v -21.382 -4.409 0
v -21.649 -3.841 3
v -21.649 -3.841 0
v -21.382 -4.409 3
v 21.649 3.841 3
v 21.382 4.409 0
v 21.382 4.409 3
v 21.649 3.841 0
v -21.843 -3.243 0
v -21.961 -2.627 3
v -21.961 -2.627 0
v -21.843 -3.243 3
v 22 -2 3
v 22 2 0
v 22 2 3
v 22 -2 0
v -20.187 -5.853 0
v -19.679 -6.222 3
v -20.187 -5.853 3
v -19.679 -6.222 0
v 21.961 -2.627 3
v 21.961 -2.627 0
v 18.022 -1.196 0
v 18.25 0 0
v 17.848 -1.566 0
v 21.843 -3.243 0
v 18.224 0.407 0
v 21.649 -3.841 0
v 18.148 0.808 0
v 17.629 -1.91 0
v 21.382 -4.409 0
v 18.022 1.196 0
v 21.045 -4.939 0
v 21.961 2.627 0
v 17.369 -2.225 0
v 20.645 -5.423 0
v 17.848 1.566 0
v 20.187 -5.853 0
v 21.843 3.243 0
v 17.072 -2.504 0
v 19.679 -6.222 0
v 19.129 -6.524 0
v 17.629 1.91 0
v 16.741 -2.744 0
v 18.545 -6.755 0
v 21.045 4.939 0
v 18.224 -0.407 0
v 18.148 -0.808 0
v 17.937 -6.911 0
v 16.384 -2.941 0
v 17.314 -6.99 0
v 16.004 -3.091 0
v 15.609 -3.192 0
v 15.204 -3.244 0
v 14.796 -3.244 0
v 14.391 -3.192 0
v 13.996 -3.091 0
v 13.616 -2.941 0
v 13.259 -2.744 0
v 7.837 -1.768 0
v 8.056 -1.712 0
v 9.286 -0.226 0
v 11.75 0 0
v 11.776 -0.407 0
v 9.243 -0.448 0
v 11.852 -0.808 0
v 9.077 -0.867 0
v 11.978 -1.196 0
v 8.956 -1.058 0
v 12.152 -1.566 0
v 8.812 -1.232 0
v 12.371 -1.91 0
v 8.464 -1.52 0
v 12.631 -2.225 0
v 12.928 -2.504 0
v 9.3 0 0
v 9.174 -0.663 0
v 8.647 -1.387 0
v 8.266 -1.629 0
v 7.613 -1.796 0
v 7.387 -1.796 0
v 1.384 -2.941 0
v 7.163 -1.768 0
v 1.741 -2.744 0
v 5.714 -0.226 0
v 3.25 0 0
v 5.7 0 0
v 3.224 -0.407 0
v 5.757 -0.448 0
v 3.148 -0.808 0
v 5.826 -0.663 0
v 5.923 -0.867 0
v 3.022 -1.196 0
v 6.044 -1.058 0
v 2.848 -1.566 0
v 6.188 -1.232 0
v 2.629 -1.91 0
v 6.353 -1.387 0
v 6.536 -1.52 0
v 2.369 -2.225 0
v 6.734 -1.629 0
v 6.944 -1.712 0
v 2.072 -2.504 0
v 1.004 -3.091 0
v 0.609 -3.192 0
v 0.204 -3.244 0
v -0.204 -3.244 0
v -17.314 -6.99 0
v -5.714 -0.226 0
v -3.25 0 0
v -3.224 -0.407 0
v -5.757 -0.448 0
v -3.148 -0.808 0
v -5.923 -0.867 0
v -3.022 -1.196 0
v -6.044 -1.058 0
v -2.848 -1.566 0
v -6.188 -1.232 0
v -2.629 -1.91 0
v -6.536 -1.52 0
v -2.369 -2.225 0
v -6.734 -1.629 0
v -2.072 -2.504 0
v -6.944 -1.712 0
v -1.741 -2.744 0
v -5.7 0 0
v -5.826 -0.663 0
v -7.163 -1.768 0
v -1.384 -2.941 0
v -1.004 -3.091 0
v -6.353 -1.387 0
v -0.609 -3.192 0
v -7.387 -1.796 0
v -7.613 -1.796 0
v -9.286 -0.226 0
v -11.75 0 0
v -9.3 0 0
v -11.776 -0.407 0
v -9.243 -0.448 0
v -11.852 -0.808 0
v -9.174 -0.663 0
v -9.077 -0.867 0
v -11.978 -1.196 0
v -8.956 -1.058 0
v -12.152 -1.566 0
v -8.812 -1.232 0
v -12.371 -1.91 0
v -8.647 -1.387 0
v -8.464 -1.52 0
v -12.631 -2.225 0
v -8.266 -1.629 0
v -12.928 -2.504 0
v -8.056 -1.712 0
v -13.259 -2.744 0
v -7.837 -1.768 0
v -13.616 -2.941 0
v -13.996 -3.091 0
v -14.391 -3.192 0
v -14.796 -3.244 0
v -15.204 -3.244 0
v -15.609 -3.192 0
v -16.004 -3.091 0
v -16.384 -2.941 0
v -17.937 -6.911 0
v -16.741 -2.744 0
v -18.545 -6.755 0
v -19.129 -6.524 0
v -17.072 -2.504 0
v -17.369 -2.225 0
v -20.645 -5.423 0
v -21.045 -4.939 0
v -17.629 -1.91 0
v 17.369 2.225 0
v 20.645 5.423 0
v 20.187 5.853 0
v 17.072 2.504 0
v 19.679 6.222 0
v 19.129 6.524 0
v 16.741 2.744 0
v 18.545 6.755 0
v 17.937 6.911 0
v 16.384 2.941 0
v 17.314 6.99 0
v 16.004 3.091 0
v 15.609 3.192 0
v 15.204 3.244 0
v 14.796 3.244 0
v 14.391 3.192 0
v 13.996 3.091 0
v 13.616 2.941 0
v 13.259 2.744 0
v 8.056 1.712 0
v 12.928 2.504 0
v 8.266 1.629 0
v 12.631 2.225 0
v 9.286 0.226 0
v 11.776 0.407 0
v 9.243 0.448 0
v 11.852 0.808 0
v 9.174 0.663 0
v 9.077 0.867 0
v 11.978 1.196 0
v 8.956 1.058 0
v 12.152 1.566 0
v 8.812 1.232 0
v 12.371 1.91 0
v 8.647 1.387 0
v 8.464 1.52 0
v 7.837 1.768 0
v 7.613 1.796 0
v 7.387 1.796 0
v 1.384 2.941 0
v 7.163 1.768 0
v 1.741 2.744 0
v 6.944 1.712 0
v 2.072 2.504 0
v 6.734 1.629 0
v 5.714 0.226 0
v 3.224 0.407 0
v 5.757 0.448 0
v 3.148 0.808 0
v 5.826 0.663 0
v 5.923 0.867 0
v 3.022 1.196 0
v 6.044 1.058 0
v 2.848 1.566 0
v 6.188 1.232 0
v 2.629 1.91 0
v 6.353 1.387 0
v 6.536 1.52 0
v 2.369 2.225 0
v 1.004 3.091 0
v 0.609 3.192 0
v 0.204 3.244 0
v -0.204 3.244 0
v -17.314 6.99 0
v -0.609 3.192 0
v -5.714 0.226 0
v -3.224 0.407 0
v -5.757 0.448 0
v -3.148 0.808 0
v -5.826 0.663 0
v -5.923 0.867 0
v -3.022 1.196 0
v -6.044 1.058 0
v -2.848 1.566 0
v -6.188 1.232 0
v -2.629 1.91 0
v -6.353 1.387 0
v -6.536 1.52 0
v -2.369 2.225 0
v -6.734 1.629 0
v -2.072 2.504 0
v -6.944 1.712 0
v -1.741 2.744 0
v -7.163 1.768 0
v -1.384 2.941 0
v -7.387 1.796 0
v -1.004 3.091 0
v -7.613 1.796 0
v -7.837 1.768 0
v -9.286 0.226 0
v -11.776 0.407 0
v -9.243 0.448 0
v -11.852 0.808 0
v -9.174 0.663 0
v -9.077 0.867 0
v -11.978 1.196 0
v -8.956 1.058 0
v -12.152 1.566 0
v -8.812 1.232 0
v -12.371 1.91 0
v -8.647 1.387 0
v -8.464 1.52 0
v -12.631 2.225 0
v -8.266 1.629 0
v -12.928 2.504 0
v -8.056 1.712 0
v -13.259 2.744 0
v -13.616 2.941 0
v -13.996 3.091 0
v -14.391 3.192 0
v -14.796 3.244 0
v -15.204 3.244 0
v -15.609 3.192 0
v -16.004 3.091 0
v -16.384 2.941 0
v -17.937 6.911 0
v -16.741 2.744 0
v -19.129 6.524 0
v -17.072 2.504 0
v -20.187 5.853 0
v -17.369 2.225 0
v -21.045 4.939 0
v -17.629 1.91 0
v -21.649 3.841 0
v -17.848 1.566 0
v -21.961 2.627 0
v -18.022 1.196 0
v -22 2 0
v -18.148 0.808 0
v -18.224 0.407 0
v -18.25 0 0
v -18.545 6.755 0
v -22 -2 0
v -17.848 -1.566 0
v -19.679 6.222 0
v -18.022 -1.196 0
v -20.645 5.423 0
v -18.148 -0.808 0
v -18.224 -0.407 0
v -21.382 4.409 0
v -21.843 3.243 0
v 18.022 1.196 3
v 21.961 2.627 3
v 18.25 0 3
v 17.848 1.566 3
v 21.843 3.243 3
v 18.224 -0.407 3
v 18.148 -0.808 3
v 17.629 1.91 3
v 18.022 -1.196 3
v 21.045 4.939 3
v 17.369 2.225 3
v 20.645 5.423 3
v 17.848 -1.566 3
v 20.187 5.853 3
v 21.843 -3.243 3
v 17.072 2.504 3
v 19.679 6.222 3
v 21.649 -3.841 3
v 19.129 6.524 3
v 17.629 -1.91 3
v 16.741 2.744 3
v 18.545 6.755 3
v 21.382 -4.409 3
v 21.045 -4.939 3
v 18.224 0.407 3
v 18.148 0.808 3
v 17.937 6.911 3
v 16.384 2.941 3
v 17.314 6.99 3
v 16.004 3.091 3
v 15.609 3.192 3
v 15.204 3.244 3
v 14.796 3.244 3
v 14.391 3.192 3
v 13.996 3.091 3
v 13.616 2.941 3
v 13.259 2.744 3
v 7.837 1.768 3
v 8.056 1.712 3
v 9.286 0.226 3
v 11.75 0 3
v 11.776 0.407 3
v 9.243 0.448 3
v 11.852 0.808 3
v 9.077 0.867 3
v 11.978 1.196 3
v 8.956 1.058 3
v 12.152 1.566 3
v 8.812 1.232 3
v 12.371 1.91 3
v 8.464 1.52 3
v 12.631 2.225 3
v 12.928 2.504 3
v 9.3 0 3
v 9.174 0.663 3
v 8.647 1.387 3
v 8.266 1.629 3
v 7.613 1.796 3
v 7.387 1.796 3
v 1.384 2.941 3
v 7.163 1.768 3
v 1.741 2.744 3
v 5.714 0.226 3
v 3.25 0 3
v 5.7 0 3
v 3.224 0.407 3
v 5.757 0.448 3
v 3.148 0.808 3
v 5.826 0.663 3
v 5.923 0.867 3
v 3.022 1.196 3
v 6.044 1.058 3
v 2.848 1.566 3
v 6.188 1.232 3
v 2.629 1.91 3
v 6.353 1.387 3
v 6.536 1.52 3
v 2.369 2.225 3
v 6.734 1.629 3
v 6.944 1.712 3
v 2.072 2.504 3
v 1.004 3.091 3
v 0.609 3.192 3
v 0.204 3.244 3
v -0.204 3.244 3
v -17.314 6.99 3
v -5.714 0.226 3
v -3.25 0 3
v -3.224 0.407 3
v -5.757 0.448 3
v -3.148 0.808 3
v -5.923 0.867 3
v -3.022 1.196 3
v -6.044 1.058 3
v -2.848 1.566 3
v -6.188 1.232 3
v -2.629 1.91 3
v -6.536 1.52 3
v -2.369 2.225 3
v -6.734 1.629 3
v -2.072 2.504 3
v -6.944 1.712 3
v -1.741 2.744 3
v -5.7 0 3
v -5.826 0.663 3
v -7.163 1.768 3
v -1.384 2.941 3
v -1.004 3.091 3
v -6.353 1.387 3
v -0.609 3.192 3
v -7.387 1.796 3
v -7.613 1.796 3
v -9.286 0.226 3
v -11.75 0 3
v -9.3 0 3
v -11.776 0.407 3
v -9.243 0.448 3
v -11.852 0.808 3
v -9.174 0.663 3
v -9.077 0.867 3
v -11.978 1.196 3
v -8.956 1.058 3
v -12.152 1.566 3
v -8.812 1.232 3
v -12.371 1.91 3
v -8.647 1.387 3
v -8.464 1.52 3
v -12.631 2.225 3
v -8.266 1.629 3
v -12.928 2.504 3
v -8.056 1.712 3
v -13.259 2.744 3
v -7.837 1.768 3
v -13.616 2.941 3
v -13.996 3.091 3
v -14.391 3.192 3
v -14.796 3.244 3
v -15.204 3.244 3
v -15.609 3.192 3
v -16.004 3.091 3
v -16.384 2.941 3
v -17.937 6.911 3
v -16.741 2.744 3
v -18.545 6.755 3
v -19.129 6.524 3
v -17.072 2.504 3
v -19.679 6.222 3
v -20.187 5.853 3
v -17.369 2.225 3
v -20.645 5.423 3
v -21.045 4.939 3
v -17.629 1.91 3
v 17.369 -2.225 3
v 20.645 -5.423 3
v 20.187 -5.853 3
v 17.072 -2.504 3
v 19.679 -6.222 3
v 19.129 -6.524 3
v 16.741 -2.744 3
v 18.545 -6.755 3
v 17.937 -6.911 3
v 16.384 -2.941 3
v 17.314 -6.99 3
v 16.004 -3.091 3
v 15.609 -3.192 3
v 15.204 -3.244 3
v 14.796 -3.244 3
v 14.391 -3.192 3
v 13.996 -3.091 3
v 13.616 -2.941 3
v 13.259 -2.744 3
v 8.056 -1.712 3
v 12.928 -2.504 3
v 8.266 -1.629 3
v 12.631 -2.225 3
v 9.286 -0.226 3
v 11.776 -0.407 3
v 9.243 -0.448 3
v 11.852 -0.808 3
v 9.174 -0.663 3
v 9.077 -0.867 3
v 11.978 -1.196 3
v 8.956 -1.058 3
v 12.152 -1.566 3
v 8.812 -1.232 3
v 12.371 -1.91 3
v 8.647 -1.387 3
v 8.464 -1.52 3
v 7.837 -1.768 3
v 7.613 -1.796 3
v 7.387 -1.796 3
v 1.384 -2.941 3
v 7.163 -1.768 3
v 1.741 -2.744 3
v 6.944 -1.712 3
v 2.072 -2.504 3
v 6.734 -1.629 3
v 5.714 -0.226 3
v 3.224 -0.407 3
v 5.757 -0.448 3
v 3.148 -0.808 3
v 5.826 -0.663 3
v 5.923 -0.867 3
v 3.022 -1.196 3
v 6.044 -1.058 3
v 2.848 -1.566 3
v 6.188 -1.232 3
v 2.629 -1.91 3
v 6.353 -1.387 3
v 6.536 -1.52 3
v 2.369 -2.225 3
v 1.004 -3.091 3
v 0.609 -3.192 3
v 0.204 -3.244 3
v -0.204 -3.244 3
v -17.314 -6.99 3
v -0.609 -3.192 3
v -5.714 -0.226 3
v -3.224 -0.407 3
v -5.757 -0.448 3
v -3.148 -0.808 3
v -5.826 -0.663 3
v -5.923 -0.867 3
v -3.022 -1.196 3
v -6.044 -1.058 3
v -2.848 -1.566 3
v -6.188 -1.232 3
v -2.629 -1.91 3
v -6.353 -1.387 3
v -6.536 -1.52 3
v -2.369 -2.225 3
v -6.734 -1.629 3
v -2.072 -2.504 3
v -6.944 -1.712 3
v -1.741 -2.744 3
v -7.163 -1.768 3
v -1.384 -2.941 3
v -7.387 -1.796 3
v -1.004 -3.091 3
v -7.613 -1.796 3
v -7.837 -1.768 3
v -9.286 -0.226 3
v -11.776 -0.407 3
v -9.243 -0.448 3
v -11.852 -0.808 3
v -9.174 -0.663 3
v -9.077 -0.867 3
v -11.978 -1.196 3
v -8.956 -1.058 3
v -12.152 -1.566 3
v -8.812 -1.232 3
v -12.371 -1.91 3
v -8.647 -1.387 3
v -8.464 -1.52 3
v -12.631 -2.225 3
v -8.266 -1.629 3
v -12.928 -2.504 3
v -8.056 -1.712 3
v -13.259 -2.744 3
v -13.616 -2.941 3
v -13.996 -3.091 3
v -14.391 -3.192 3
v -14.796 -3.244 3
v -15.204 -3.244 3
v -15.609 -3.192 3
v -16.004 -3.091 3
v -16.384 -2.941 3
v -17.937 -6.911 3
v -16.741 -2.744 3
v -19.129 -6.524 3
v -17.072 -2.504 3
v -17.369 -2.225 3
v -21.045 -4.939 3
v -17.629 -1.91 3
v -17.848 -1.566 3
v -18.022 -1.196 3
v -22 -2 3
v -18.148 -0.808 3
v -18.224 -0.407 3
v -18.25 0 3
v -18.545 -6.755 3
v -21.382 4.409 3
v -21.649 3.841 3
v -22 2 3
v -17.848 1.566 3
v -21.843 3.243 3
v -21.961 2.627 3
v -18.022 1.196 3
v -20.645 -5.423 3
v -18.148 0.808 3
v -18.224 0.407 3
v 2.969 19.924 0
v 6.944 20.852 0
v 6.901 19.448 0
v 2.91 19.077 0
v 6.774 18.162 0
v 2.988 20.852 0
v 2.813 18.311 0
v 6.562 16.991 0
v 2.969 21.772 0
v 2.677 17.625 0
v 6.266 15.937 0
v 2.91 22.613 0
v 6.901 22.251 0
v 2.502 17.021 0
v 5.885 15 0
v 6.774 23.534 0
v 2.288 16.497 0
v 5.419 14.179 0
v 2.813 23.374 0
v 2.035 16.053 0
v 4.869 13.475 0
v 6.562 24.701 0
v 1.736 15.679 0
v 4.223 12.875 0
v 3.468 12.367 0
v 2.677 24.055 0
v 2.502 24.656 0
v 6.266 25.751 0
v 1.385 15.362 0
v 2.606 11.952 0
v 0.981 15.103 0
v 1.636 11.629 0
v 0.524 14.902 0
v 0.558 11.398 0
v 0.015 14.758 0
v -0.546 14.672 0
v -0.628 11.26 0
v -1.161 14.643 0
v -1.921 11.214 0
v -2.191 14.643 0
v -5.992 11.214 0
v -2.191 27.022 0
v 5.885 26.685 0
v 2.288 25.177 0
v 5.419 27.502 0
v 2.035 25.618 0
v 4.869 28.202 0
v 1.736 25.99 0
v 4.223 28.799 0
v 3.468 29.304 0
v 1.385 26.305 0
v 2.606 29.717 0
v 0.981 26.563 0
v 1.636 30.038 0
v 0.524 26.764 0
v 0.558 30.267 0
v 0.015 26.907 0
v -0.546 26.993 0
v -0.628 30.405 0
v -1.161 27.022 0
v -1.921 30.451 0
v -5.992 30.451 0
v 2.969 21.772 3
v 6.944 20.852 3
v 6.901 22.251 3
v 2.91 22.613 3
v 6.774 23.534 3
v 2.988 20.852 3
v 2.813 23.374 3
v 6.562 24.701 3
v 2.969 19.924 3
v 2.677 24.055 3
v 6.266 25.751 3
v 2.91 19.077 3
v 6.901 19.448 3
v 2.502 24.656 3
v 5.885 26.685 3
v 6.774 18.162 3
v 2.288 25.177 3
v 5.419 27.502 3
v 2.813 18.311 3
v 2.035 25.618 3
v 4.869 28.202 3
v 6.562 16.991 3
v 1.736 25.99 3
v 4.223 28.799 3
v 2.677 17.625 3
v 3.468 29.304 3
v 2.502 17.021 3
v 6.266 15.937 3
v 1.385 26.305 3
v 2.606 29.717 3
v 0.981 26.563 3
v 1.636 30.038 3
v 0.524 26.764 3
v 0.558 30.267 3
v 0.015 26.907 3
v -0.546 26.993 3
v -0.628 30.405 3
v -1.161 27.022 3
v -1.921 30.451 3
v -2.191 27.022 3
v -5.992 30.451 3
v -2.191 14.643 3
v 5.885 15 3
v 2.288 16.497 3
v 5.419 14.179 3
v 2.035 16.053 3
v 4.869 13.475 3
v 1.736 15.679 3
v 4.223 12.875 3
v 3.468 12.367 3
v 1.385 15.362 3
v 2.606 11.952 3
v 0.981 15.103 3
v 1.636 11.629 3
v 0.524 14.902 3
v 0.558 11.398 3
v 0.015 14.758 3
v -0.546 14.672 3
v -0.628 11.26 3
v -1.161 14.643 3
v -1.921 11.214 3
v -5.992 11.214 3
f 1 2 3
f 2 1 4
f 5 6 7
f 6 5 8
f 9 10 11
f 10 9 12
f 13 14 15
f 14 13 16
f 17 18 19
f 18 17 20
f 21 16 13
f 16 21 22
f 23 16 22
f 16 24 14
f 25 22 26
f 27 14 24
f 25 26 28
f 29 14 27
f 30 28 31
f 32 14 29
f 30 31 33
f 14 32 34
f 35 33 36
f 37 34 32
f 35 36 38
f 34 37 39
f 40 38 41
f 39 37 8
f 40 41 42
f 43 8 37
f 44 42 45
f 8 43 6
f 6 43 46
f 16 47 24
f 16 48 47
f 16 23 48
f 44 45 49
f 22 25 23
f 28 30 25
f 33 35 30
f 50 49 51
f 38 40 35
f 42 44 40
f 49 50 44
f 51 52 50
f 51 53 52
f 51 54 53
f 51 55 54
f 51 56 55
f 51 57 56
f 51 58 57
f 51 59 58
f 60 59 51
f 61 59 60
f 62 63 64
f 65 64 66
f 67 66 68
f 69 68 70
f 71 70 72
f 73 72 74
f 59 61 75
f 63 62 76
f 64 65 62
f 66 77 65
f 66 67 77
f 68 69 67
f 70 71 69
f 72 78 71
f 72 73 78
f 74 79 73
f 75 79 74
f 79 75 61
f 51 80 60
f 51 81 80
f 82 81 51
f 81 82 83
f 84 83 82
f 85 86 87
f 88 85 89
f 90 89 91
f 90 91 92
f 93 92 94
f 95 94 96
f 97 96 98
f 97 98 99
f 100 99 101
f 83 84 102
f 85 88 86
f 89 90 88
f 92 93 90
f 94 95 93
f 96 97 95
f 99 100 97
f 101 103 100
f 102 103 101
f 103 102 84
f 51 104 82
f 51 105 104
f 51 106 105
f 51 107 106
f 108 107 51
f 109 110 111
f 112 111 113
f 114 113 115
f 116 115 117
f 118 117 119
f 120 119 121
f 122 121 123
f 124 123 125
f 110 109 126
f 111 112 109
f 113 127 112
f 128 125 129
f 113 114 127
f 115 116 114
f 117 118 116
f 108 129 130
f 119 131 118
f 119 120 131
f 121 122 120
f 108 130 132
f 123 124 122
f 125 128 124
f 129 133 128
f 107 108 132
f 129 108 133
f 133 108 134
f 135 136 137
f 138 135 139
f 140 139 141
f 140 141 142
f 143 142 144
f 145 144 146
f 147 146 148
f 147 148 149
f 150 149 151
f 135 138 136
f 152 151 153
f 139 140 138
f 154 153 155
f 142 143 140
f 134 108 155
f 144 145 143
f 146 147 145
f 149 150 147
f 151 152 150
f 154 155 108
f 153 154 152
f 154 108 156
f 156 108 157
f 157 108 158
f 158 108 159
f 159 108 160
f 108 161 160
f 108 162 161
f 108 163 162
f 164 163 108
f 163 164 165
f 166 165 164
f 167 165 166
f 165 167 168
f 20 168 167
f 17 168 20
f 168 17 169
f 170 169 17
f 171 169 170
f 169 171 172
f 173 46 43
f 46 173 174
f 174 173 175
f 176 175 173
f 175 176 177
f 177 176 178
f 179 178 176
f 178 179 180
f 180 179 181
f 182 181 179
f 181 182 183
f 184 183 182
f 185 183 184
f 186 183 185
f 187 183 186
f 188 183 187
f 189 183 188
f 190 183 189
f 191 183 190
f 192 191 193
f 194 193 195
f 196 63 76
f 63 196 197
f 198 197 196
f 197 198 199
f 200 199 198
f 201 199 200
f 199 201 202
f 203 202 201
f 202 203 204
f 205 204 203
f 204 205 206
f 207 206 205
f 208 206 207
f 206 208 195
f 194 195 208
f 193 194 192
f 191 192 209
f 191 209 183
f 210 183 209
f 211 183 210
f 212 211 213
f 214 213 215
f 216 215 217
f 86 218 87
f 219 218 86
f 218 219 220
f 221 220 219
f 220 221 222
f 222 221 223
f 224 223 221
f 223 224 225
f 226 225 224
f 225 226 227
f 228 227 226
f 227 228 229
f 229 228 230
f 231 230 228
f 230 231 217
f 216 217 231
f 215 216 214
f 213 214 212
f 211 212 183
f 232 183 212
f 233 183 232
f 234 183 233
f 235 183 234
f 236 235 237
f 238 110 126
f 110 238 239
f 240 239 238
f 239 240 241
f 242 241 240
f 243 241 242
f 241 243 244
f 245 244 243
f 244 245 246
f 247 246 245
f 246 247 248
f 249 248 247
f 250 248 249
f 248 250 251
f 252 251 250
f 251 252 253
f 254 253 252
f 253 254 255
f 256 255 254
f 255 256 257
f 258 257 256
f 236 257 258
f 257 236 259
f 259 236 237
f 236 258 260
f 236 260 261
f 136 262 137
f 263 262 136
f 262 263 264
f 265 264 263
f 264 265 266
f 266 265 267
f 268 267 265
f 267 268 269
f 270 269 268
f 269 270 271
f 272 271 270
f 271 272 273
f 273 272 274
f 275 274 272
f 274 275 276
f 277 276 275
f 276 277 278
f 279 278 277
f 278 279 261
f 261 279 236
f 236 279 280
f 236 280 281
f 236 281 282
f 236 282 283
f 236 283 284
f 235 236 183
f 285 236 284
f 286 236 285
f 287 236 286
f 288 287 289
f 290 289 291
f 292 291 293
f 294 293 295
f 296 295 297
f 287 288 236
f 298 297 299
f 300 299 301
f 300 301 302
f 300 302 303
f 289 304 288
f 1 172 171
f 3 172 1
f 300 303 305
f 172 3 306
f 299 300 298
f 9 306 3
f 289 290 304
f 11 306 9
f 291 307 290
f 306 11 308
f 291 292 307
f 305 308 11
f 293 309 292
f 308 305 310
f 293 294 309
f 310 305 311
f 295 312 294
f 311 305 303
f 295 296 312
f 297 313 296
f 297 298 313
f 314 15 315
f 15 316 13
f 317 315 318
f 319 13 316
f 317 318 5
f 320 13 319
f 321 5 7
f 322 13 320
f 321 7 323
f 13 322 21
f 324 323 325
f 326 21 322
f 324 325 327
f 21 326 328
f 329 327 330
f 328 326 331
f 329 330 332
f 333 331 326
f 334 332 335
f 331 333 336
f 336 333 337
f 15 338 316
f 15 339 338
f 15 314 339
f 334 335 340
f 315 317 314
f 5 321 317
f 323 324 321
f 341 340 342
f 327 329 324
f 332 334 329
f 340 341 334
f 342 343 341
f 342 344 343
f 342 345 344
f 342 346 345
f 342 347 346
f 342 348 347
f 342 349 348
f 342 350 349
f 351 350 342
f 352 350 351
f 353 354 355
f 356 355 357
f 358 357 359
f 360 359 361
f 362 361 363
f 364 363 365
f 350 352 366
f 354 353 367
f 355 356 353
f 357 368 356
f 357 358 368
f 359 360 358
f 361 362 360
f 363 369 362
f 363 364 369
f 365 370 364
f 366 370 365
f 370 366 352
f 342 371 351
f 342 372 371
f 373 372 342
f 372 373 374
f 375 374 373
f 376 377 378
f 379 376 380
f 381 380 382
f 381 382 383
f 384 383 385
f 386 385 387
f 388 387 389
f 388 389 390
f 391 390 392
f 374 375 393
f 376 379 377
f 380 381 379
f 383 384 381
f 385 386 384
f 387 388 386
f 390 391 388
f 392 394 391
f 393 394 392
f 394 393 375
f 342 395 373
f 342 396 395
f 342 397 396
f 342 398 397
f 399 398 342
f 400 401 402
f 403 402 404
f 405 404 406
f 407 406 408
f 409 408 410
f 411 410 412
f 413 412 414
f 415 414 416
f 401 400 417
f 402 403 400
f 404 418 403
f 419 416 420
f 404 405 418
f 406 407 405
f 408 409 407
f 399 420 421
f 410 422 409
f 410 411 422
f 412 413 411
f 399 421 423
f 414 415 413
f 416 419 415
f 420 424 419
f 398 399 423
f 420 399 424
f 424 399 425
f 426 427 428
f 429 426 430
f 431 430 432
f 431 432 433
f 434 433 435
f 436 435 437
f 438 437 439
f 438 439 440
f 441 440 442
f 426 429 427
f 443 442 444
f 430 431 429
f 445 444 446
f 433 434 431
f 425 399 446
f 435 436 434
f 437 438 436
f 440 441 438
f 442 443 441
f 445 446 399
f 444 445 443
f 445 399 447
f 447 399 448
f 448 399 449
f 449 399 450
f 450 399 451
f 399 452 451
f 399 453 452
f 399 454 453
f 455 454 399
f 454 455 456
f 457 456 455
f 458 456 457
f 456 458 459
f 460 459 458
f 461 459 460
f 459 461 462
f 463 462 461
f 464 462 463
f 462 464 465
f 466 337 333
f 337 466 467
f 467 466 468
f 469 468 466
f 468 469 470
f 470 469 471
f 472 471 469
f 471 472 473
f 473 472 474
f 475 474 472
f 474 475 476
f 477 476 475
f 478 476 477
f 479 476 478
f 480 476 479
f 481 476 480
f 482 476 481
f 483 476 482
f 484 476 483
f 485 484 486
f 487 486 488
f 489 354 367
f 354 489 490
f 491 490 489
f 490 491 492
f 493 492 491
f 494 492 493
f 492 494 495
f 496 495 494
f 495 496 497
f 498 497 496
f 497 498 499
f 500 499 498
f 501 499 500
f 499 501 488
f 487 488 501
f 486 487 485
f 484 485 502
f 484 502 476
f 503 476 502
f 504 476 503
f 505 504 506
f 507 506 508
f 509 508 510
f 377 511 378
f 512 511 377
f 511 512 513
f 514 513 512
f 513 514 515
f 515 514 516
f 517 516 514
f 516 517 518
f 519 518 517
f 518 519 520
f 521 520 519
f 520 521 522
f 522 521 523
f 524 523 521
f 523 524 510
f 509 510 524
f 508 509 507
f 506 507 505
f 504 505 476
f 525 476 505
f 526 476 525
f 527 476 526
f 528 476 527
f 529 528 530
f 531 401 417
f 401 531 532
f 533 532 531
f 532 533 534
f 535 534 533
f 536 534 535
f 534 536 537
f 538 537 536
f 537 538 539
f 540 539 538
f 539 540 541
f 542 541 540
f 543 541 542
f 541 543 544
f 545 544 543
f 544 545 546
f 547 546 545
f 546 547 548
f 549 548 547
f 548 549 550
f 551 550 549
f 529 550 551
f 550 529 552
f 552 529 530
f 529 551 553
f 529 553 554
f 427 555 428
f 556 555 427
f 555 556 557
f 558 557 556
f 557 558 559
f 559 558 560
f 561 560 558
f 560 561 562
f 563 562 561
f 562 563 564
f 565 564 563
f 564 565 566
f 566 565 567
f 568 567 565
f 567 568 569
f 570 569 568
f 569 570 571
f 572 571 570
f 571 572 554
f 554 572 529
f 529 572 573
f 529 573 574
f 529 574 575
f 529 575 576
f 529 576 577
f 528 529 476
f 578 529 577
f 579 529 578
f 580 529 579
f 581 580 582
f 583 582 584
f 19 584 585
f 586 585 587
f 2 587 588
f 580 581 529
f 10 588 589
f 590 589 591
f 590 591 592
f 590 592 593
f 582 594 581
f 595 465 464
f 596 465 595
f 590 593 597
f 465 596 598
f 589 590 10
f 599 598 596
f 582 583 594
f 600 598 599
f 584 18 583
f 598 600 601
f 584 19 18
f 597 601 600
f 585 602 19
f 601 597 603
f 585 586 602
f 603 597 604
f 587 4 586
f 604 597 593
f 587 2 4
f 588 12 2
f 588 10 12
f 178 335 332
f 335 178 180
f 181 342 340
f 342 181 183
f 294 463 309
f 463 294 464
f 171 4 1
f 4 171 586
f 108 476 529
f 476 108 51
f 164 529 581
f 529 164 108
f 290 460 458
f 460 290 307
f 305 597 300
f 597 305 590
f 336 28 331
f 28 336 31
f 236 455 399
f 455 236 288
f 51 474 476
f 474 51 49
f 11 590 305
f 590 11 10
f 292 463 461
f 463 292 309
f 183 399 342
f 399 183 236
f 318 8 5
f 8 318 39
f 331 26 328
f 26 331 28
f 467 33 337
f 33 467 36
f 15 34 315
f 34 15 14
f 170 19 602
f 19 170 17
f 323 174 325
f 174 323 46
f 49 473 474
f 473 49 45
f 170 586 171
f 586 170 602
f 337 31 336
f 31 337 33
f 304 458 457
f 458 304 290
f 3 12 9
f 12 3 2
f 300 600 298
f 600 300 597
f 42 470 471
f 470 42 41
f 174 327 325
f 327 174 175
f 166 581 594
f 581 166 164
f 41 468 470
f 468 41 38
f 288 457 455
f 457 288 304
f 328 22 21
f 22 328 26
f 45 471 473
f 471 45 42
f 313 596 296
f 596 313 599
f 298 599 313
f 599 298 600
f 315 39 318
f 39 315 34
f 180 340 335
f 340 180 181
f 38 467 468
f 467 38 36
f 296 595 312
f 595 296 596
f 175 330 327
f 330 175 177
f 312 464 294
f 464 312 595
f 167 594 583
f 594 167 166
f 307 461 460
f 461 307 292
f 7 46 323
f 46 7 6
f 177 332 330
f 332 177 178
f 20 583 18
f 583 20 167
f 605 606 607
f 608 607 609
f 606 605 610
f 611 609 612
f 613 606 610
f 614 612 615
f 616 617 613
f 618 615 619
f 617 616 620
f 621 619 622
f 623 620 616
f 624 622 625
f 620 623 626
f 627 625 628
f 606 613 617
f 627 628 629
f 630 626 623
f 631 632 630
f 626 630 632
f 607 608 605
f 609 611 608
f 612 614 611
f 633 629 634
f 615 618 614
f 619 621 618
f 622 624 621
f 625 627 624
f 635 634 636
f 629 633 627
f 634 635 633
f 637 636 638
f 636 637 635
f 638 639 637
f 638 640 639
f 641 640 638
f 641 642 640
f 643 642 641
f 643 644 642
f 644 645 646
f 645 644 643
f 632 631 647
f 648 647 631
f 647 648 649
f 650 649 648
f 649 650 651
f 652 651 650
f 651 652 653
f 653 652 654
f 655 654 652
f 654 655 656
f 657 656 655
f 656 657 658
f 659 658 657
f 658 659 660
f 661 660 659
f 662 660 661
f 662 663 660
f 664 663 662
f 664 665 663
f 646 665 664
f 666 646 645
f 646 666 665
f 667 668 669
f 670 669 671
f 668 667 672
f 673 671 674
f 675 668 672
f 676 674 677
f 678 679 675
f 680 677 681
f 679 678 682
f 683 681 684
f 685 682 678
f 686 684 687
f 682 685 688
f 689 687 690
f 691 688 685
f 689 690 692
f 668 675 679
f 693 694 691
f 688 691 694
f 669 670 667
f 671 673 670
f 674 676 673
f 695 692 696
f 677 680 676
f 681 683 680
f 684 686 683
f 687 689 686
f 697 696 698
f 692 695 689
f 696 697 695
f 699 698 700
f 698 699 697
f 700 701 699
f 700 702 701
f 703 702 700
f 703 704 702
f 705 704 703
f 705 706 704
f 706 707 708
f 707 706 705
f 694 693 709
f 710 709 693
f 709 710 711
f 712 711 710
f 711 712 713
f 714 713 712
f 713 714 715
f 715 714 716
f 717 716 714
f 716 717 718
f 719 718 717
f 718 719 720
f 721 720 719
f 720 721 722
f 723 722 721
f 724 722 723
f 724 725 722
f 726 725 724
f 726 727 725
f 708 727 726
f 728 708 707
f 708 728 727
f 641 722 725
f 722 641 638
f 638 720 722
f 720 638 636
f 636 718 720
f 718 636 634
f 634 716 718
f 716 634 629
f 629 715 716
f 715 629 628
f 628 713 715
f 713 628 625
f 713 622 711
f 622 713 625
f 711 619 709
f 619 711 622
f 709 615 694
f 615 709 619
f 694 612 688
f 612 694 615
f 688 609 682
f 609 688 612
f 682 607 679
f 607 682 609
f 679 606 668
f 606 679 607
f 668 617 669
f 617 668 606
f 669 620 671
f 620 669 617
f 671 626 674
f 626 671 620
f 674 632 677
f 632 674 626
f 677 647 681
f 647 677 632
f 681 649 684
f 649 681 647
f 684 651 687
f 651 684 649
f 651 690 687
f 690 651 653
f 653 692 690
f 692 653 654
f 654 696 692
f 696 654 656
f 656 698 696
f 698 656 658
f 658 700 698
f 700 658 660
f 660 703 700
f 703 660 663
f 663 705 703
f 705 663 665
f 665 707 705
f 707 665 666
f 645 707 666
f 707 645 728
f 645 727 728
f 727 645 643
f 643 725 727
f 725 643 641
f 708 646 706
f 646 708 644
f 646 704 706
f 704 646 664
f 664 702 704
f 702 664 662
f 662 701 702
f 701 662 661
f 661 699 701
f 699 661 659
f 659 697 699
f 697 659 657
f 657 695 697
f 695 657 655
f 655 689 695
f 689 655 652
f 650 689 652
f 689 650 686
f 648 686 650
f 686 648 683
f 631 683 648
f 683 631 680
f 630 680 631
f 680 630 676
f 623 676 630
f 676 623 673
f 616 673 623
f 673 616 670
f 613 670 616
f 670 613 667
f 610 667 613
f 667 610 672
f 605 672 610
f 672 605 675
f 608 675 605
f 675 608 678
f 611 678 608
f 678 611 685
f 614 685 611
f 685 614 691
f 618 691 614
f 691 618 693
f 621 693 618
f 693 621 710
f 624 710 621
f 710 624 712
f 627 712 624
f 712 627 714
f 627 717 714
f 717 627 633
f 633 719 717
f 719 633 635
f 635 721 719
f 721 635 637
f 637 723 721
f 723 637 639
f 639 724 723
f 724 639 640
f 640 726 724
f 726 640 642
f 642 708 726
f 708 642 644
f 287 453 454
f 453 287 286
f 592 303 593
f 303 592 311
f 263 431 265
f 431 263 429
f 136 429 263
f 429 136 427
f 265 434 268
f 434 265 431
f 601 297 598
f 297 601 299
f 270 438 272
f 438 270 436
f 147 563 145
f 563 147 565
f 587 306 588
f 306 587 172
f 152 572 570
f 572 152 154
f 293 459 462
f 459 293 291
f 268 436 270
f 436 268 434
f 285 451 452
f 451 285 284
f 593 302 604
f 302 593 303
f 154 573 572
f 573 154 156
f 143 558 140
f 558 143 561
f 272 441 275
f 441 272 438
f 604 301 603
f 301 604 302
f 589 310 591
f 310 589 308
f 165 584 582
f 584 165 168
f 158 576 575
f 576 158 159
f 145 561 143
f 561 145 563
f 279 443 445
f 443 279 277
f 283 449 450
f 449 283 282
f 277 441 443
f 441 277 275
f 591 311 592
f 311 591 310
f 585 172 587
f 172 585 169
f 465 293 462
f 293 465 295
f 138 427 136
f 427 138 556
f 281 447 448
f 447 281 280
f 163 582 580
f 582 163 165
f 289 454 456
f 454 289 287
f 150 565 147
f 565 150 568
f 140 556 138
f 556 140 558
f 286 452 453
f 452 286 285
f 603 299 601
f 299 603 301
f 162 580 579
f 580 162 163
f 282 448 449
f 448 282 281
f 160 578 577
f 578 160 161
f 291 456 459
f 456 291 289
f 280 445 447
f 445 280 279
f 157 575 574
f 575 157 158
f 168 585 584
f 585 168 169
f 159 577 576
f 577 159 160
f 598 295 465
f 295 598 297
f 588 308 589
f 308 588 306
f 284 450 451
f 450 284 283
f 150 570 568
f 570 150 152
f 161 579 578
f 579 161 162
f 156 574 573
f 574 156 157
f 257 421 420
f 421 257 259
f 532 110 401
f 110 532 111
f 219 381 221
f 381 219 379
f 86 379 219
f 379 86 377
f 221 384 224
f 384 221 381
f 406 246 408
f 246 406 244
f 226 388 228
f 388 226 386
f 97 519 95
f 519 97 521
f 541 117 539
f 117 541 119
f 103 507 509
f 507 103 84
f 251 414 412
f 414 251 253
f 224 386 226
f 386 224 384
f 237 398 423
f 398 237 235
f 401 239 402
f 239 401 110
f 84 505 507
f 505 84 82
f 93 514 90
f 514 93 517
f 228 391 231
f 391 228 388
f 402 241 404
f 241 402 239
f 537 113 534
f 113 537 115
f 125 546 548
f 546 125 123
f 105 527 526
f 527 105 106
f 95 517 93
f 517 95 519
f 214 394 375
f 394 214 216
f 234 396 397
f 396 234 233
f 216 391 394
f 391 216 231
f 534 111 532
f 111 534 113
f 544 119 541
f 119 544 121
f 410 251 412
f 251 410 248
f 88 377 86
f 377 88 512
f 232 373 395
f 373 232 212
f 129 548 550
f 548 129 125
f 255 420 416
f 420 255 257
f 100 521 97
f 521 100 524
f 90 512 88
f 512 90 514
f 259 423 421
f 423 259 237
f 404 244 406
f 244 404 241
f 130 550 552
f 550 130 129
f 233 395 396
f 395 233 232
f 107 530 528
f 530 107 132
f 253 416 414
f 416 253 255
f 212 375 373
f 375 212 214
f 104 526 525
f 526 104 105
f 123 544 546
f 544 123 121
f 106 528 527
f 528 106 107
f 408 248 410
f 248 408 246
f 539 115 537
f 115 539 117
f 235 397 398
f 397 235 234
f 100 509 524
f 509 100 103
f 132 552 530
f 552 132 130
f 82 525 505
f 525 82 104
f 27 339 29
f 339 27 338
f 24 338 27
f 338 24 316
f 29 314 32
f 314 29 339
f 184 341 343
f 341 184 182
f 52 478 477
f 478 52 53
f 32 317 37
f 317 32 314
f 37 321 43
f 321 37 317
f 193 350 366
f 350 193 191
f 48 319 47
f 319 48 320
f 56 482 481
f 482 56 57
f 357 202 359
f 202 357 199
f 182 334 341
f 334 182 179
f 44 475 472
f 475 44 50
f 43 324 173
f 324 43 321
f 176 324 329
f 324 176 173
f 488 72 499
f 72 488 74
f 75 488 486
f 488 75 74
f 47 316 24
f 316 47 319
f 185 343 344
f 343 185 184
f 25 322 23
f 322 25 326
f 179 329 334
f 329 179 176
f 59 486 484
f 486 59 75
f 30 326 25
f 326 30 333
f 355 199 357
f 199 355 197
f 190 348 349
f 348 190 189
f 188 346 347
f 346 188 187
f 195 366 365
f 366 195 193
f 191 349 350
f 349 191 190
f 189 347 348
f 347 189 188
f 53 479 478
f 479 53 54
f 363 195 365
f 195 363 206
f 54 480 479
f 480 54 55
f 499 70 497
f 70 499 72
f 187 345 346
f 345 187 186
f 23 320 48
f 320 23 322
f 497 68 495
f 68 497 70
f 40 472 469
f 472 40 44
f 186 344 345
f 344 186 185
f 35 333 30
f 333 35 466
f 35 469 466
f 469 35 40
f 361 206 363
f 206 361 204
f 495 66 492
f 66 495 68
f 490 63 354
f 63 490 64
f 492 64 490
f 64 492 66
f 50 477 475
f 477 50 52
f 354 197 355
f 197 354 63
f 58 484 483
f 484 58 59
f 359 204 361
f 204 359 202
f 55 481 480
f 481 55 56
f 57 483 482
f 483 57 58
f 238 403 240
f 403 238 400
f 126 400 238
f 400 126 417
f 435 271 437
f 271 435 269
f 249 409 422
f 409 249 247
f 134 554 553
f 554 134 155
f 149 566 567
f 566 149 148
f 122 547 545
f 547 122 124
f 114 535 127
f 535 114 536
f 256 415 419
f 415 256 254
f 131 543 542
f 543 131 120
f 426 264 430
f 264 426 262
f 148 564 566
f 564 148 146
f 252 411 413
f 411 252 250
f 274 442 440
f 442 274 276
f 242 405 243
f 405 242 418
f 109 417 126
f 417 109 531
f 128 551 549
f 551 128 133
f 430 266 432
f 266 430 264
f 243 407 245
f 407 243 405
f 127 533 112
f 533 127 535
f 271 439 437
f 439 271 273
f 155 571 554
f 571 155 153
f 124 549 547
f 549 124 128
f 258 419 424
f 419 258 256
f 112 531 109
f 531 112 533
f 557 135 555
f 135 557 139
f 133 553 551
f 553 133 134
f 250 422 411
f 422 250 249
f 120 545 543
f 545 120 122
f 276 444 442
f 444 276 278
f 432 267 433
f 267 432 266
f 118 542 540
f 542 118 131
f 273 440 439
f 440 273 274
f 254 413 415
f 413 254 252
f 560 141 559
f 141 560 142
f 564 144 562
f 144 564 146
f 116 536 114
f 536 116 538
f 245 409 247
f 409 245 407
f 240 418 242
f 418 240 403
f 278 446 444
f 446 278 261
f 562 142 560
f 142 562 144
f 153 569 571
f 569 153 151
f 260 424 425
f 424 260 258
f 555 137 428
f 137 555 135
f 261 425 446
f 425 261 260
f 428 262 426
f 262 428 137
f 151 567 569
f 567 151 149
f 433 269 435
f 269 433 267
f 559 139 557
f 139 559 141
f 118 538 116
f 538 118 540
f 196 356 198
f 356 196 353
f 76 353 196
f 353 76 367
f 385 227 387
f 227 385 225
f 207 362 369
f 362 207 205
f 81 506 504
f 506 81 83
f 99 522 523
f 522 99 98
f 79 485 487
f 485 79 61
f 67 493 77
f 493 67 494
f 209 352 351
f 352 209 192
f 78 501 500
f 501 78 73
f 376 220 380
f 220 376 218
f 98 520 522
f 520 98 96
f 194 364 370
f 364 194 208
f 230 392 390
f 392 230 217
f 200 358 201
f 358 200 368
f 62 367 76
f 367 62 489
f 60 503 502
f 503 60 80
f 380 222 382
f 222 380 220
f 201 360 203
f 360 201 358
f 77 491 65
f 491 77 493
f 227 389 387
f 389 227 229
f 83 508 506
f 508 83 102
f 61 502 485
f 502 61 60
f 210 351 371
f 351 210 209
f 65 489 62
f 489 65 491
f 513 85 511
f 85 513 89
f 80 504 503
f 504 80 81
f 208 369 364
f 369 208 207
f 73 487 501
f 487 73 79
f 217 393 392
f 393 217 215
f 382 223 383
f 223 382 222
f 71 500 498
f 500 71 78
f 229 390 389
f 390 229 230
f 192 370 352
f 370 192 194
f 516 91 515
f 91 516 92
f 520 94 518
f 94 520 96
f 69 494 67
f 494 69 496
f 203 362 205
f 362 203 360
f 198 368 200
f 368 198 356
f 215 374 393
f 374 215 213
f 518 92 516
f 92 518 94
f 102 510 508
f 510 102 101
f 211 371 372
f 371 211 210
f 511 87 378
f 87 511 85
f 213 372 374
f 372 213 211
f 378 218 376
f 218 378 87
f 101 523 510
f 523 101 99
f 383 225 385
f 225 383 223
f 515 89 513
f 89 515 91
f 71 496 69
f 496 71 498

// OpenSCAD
$fn = 50;


difference() {
	union() {
		hull() {
			translate(v = [-17.0000000000, 2.0000000000, 0]) {
				cylinder(h = 3, r = 5);
			}
			translate(v = [17.0000000000, 2.0000000000, 0]) {
				cylinder(h = 3, r = 5);
			}
			translate(v = [-17.0000000000, -2.0000000000, 0]) {
				cylinder(h = 3, r = 5);
			}
			translate(v = [17.0000000000, -2.0000000000, 0]) {
				cylinder(h = 3, r = 5);
			}
		}
		translate(v = [0, 30.0000000000, 0]) {
			linear_extrude(height = 3) {
				text(font = "DejaVu Sans Mono:style=Bold", halign = "center", size = 19.0000000000, text = "D", valign = "top");
			}
		}
	}
	union() {
		translate(v = [-15.0000000000, 0.0000000000, 0]) {
			translate(v = [0, 0, -100]) {
				cylinder(h = 200, r = 3.2500000000);
			}
		}
		translate(v = [0, 0, -100]) {
			cylinder(h = 200, r = 3.2500000000);
		}
		translate(v = [15.0000000000, 0.0000000000, 0]) {
			translate(v = [0, 0, -100]) {
				cylinder(h = 200, r = 3.2500000000);
			}
		}
		translate(v = [-15.0000000000, 0.0000000000, 0]) {
			translate(v = [0, 0, -100]) {
				cylinder(h = 200, r = 1.8000000000);
			}
		}
		translate(v = [-7.5000000000, 0.0000000000, 0]) {
			translate(v = [0, 0, -100]) {
				cylinder(h = 200, r = 1.8000000000);
			}
		}
		translate(v = [0, 0, -100]) {
			cylinder(h = 200, r = 1.8000000000);
		}
		translate(v = [7.5000000000, 0.0000000000, 0]) {
			translate(v = [0, 0, -100]) {
				cylinder(h = 200, r = 1.8000000000);
			}
		}
		translate(v = [15.0000000000, 0.0000000000, 0]) {
			translate(v = [0, 0, -100]) {
				cylinder(h = 200, r = 1.8000000000);
			}
		}
	}
}
